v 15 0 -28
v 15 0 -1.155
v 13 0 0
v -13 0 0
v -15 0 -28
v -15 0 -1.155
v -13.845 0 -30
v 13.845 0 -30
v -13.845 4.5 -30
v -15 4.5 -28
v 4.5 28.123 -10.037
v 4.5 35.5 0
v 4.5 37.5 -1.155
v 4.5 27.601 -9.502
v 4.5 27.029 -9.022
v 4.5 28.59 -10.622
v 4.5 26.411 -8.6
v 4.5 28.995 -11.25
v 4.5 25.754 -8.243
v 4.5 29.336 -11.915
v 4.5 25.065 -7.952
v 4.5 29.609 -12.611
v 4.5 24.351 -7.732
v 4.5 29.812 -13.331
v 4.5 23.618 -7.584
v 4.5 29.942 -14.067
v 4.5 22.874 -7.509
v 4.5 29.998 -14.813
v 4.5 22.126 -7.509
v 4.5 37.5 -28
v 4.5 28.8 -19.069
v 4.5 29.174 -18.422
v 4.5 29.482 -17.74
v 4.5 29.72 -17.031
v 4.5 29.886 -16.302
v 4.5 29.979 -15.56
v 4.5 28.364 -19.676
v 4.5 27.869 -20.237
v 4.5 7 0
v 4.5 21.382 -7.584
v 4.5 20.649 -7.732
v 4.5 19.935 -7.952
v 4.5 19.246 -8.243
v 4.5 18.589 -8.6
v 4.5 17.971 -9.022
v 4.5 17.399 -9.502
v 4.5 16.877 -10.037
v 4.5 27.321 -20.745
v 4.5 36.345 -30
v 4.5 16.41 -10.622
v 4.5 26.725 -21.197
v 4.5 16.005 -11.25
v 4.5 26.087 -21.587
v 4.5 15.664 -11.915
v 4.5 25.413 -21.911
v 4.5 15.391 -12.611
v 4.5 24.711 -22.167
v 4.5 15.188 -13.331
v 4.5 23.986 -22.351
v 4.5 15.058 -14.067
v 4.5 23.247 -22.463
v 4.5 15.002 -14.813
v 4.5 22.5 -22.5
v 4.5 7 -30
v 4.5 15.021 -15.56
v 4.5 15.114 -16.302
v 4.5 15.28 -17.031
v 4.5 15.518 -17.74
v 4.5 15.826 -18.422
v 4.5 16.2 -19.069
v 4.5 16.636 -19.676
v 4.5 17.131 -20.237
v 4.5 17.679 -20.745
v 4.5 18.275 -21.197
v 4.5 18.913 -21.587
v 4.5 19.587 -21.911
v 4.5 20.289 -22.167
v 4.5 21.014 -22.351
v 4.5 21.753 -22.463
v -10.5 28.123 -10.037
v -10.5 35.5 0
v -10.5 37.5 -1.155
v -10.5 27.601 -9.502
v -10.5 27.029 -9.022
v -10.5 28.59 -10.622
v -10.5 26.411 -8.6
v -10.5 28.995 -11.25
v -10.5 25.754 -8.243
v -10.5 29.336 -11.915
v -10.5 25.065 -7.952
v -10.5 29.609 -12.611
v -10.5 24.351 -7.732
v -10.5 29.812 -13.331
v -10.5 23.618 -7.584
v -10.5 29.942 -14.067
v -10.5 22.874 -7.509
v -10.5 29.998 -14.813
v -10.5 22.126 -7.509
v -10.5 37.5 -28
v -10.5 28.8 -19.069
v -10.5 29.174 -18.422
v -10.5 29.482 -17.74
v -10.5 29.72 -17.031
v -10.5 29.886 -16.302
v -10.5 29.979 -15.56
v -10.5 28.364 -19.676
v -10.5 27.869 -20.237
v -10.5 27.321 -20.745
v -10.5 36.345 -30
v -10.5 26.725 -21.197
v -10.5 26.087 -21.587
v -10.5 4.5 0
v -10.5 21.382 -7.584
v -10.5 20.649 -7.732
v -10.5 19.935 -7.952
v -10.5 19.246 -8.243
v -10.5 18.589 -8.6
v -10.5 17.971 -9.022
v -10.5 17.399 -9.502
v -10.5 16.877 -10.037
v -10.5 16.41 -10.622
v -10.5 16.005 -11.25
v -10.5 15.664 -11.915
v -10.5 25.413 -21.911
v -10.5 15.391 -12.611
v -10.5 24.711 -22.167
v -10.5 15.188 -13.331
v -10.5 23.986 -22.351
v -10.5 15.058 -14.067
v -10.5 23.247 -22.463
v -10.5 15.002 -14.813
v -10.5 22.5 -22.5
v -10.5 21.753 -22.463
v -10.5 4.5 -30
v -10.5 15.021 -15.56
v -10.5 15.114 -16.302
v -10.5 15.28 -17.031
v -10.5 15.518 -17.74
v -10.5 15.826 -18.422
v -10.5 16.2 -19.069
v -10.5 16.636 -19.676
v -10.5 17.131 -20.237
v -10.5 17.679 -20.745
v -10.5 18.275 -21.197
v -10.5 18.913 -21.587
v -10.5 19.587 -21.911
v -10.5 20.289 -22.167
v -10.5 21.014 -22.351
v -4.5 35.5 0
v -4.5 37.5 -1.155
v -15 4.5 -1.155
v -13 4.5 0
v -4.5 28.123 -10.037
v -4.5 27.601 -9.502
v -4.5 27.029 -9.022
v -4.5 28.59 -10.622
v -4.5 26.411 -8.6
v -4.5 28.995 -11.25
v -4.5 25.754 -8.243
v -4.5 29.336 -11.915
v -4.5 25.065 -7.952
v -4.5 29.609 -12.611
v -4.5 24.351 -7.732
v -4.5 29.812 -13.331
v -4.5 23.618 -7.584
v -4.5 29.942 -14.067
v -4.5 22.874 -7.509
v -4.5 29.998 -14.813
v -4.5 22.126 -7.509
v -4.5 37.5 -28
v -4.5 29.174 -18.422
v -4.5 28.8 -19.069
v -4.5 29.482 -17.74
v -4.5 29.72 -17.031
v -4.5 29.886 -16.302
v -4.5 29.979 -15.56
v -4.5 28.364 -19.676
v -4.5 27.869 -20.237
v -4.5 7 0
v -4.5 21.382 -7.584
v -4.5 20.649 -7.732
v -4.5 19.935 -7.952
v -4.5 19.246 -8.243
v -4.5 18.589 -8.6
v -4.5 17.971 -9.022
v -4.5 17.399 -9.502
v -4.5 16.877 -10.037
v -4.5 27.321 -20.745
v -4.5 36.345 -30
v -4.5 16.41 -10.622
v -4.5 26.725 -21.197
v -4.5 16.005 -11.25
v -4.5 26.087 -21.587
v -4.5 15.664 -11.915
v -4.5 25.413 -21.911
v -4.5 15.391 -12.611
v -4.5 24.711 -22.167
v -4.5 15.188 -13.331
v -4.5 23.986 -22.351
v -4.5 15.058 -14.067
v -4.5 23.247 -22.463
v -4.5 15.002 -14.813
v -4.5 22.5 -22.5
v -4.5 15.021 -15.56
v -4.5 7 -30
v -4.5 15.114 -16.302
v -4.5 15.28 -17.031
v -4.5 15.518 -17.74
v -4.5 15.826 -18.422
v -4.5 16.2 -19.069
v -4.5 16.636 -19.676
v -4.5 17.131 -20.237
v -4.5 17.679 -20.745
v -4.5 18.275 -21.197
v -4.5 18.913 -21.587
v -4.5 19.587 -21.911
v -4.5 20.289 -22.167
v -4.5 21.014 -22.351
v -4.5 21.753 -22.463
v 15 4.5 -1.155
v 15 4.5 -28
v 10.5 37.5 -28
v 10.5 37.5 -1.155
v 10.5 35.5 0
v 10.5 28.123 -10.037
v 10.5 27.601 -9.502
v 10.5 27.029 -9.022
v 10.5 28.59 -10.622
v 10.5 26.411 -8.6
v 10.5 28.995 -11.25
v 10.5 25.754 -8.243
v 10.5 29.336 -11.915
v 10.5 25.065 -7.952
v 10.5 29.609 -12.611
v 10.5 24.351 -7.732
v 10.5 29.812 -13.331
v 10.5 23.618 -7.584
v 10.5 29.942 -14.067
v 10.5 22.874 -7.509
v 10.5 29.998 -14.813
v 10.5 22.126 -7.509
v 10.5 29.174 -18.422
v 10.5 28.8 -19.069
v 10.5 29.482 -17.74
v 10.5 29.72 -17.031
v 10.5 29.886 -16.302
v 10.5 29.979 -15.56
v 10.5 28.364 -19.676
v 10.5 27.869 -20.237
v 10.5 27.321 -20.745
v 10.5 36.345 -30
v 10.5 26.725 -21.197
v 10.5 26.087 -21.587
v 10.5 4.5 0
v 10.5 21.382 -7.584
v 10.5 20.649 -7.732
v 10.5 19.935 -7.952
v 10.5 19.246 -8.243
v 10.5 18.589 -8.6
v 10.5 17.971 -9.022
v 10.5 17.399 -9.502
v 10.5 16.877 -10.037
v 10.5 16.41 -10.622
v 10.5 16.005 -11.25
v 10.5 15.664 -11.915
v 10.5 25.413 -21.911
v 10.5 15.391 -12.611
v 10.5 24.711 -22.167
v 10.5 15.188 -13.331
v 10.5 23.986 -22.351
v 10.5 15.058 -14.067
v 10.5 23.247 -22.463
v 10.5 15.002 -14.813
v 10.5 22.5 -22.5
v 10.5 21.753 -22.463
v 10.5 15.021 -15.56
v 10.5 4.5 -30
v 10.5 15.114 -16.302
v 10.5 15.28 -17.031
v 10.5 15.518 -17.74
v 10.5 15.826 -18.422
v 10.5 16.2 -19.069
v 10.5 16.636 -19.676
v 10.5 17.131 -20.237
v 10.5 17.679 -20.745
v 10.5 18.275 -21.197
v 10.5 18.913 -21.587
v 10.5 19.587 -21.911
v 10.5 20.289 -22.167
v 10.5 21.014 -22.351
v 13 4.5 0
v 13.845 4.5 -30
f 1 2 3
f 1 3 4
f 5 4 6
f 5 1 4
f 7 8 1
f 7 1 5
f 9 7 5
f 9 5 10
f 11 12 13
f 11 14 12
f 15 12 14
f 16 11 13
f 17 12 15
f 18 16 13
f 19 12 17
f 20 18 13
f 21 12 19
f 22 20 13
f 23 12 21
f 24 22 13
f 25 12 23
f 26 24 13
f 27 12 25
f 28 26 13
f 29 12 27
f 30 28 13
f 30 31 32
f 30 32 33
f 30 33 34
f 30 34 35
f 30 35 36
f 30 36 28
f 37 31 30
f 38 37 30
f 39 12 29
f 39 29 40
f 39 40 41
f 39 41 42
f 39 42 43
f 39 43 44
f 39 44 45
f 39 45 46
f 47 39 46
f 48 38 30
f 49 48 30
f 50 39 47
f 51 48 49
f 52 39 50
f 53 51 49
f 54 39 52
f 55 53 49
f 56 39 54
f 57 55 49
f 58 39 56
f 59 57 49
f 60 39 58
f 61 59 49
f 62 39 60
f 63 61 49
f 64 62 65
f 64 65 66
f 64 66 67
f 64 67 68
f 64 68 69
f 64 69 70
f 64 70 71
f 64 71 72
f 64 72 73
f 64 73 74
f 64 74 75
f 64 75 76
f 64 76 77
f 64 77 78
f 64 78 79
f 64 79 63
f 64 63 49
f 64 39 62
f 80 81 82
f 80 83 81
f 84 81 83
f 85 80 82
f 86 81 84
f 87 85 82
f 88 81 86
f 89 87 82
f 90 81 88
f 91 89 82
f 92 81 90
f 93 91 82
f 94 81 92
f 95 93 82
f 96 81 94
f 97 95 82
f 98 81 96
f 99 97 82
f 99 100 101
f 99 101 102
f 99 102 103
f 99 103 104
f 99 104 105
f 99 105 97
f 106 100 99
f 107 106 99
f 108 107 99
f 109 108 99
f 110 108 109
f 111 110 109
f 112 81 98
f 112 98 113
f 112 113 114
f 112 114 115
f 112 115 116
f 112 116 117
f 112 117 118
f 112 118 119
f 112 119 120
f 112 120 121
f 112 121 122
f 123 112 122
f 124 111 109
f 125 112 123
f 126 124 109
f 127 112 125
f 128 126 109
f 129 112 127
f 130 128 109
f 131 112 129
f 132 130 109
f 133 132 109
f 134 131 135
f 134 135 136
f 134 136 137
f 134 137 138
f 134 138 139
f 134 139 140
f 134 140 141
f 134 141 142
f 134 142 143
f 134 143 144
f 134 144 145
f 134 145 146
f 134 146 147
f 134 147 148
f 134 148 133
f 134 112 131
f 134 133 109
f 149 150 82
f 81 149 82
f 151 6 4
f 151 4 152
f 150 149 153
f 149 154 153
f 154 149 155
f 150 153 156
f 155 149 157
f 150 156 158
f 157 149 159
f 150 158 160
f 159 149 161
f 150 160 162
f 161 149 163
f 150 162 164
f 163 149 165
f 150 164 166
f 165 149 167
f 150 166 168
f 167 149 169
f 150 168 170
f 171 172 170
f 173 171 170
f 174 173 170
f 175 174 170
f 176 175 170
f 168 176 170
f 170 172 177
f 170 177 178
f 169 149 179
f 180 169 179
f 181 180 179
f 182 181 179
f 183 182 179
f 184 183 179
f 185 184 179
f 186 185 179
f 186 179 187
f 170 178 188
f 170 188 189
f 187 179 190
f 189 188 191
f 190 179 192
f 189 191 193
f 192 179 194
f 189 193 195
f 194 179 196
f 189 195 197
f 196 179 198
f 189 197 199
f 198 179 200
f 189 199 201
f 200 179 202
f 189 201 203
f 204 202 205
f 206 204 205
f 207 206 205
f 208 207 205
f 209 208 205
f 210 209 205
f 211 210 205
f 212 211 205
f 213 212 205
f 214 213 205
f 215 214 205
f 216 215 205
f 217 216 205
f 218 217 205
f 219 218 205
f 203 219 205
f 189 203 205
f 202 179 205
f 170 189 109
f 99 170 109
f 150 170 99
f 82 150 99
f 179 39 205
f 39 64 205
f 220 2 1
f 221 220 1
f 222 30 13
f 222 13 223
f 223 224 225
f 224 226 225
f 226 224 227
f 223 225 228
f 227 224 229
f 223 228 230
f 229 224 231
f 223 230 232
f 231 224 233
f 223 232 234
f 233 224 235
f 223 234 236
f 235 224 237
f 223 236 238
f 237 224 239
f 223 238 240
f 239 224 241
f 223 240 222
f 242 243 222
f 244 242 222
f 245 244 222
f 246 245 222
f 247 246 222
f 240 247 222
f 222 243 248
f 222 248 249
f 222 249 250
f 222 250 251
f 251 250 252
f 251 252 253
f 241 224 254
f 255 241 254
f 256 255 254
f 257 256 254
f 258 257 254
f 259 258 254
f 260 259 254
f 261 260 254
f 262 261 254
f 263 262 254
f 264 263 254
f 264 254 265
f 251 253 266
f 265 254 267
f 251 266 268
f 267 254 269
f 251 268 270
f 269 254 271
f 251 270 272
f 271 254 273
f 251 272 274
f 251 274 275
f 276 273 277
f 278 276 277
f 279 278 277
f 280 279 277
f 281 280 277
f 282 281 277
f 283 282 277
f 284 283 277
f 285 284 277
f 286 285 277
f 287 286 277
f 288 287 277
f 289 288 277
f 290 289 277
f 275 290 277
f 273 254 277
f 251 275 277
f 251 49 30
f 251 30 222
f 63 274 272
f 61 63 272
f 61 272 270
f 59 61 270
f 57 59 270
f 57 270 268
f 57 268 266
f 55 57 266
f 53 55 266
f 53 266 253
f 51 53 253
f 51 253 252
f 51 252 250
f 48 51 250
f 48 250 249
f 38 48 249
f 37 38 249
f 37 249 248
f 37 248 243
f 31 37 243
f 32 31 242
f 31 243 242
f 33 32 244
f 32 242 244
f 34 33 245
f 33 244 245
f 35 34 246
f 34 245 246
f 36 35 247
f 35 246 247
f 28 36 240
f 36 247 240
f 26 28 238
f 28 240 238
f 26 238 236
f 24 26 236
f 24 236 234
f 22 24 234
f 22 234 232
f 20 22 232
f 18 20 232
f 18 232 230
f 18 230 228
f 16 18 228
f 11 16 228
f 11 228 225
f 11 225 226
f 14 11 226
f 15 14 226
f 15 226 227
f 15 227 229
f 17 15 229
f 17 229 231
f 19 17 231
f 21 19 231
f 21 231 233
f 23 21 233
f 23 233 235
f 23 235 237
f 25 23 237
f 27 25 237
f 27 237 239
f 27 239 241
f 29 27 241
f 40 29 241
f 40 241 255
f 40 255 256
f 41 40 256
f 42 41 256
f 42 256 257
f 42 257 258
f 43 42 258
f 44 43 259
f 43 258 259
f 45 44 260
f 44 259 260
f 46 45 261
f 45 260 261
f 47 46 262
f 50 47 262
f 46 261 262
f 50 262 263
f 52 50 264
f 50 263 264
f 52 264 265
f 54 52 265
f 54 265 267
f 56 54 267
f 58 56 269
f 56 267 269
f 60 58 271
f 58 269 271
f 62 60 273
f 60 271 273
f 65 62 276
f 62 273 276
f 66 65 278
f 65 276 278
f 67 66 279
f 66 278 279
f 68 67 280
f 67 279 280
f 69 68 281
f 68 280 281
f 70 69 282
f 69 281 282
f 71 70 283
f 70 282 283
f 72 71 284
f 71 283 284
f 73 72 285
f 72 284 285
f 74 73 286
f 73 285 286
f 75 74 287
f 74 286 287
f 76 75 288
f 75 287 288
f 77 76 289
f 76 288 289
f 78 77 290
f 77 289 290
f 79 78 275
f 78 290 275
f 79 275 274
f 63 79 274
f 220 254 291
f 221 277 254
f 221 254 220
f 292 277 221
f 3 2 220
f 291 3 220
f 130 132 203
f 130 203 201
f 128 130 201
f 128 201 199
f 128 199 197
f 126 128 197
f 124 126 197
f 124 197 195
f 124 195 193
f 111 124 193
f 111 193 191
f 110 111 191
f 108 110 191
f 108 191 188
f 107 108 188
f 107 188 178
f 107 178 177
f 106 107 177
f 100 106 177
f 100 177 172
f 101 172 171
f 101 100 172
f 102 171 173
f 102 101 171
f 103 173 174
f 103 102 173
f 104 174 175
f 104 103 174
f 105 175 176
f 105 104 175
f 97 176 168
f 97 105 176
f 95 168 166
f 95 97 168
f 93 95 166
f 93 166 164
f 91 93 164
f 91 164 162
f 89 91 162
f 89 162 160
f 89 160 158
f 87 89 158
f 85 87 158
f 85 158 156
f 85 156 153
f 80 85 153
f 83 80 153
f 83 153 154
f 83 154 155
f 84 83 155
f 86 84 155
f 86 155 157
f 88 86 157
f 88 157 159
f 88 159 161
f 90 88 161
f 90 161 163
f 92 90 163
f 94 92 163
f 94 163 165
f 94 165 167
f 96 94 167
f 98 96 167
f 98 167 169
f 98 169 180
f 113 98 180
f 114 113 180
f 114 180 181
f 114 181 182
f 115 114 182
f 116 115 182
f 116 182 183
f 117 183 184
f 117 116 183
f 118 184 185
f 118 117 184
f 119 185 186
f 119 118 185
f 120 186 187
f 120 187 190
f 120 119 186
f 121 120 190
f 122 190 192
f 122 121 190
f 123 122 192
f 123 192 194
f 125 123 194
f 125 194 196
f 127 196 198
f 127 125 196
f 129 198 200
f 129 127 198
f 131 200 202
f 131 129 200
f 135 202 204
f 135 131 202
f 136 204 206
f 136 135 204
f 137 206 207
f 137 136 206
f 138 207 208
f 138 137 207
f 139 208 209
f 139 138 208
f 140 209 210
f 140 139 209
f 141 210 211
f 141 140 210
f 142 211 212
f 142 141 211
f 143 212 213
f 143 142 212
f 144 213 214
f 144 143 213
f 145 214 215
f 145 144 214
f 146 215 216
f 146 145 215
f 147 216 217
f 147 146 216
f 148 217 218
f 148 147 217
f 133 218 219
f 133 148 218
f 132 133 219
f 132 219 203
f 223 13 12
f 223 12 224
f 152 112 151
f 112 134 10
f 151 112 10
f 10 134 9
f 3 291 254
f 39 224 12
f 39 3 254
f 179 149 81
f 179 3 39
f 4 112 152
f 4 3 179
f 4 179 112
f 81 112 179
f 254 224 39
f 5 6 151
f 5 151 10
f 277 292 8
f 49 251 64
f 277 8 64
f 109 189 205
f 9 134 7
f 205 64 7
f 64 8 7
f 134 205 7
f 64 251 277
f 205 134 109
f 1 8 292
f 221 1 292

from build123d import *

# Parameters (mm, degrees)
SKETCH1_W             = 4.5
SKETCH1_H             = 30
BOSS_EXTRUDE1_DEPTH   = 4.5
SKETCH1_3_W           = 6
SKETCH1_3_H           = 30
BOSS_EXTRUDE2_DEPTH   = 37.5
SKETCH1_4_W           = 4.5
SKETCH1_4_H           = 30
BOSS_EXTRUDE3_DEPTH   = 7
CUT_EXTRUDE1_REACH    = 12.5
SKETCH2_R             = 7.5
CHAMFER1_SIZE         = 2
CHAMFER1_SIZE2        = 1.154700538
CHAMFER1_PART_2_SIZE  = 2
CHAMFER1_PART_2_SIZE2 = 1.154700538
CHAMFER1_PART_3_SIZE  = 2
CHAMFER1_PART_3_SIZE2 = 1.154700538


with BuildPart() as part:
    # Sketch1 → Boss-Extrude1 (new body)
    with BuildSketch(Plane(origin=(0, 0, 0), x_dir=(1, 0, 0), z_dir=(0, 1, 0))):
        with Locations((12.75, 15)):
            Rectangle(SKETCH1_W, SKETCH1_H)
    extrude(amount=BOSS_EXTRUDE1_DEPTH)

    # Sketch1<3> → Boss-Extrude2 (add)
    with BuildSketch(Plane(origin=(0, 0, 0), x_dir=(1, 0, 0), z_dir=(0, 1, 0))):
        with Locations((7.5, 15)):
            Rectangle(SKETCH1_3_W, SKETCH1_3_H)
    extrude(amount=BOSS_EXTRUDE2_DEPTH)

    # Sketch1<4> → Boss-Extrude3 (add)
    with BuildSketch(Plane(origin=(0, 0, 0), x_dir=(1, 0, 0), z_dir=(0, 1, 0))):
        with Locations((2.25, 15)):
            Rectangle(SKETCH1_4_W, SKETCH1_4_H)
    extrude(amount=BOSS_EXTRUDE3_DEPTH)

    # Sketch2 → Cut-Extrude1 (cut, up to next)
    with BuildSketch(Plane(origin=(10.5, 0, 0), x_dir=(0, 0, -1), z_dir=(1, 0, 0)), mode=Mode.PRIVATE) as cut_extrude1_sk1:
        with Locations((15, 22.5)):
            Circle(SKETCH2_R)
    cut_extrude1_tool1 = extrude(cut_extrude1_sk1.sketch, amount=-CUT_EXTRUDE1_REACH, mode=Mode.PRIVATE) & part.part
    add(cut_extrude1_tool1.solids().sort_by_distance((10.5, 22.5, -15))[0], mode=Mode.SUBTRACT)

    # Chamfer1
    chamfer1_edges = [part.edges().sort_by_distance(p)[0] for p in [
        (7.5, 37.5, -30),
    ]]
    chamfer1_side = [part.faces().sort_by_distance(p)[0] for p in [
        (7.5, 37.5, -15),
    ]]
    chamfer(chamfer1_edges, length=CHAMFER1_SIZE, length2=CHAMFER1_SIZE2, reference=chamfer1_side[0])

    # Chamfer1 part 2
    chamfer1_part_2_edges = [part.edges().sort_by_distance(p)[0] for p in [
        (7.5, 37.5, 0),
        (15, 2.25, 0),
    ]]
    chamfer1_part_2_side = [part.faces().sort_by_distance(p)[0] for p in [
        (7.286585366, 15.806910569, 0),
    ]]
    chamfer(chamfer1_part_2_edges, length=CHAMFER1_PART_2_SIZE, length2=CHAMFER1_PART_2_SIZE2, reference=chamfer1_part_2_side[0])

    # Chamfer1 part 3
    chamfer1_part_3_edges = [part.edges().sort_by_distance(p)[0] for p in [
        (15, 2.25, -30),
    ]]
    chamfer1_part_3_side = [part.faces().sort_by_distance(p)[0] for p in [
        (15, 2.25, -15),
    ]]
    chamfer(chamfer1_part_3_edges, length=CHAMFER1_PART_3_SIZE, length2=CHAMFER1_PART_3_SIZE2, reference=chamfer1_part_3_side[0])

    # Mirror1: part across plane


with BuildPart() as part_1:
    add(part.part)
    add(part.part.mirror(Plane(origin=(0, 7, 0), x_dir=(0, 0, 1), z_dir=(-1, 0, 0))))


solid = part_1.part
